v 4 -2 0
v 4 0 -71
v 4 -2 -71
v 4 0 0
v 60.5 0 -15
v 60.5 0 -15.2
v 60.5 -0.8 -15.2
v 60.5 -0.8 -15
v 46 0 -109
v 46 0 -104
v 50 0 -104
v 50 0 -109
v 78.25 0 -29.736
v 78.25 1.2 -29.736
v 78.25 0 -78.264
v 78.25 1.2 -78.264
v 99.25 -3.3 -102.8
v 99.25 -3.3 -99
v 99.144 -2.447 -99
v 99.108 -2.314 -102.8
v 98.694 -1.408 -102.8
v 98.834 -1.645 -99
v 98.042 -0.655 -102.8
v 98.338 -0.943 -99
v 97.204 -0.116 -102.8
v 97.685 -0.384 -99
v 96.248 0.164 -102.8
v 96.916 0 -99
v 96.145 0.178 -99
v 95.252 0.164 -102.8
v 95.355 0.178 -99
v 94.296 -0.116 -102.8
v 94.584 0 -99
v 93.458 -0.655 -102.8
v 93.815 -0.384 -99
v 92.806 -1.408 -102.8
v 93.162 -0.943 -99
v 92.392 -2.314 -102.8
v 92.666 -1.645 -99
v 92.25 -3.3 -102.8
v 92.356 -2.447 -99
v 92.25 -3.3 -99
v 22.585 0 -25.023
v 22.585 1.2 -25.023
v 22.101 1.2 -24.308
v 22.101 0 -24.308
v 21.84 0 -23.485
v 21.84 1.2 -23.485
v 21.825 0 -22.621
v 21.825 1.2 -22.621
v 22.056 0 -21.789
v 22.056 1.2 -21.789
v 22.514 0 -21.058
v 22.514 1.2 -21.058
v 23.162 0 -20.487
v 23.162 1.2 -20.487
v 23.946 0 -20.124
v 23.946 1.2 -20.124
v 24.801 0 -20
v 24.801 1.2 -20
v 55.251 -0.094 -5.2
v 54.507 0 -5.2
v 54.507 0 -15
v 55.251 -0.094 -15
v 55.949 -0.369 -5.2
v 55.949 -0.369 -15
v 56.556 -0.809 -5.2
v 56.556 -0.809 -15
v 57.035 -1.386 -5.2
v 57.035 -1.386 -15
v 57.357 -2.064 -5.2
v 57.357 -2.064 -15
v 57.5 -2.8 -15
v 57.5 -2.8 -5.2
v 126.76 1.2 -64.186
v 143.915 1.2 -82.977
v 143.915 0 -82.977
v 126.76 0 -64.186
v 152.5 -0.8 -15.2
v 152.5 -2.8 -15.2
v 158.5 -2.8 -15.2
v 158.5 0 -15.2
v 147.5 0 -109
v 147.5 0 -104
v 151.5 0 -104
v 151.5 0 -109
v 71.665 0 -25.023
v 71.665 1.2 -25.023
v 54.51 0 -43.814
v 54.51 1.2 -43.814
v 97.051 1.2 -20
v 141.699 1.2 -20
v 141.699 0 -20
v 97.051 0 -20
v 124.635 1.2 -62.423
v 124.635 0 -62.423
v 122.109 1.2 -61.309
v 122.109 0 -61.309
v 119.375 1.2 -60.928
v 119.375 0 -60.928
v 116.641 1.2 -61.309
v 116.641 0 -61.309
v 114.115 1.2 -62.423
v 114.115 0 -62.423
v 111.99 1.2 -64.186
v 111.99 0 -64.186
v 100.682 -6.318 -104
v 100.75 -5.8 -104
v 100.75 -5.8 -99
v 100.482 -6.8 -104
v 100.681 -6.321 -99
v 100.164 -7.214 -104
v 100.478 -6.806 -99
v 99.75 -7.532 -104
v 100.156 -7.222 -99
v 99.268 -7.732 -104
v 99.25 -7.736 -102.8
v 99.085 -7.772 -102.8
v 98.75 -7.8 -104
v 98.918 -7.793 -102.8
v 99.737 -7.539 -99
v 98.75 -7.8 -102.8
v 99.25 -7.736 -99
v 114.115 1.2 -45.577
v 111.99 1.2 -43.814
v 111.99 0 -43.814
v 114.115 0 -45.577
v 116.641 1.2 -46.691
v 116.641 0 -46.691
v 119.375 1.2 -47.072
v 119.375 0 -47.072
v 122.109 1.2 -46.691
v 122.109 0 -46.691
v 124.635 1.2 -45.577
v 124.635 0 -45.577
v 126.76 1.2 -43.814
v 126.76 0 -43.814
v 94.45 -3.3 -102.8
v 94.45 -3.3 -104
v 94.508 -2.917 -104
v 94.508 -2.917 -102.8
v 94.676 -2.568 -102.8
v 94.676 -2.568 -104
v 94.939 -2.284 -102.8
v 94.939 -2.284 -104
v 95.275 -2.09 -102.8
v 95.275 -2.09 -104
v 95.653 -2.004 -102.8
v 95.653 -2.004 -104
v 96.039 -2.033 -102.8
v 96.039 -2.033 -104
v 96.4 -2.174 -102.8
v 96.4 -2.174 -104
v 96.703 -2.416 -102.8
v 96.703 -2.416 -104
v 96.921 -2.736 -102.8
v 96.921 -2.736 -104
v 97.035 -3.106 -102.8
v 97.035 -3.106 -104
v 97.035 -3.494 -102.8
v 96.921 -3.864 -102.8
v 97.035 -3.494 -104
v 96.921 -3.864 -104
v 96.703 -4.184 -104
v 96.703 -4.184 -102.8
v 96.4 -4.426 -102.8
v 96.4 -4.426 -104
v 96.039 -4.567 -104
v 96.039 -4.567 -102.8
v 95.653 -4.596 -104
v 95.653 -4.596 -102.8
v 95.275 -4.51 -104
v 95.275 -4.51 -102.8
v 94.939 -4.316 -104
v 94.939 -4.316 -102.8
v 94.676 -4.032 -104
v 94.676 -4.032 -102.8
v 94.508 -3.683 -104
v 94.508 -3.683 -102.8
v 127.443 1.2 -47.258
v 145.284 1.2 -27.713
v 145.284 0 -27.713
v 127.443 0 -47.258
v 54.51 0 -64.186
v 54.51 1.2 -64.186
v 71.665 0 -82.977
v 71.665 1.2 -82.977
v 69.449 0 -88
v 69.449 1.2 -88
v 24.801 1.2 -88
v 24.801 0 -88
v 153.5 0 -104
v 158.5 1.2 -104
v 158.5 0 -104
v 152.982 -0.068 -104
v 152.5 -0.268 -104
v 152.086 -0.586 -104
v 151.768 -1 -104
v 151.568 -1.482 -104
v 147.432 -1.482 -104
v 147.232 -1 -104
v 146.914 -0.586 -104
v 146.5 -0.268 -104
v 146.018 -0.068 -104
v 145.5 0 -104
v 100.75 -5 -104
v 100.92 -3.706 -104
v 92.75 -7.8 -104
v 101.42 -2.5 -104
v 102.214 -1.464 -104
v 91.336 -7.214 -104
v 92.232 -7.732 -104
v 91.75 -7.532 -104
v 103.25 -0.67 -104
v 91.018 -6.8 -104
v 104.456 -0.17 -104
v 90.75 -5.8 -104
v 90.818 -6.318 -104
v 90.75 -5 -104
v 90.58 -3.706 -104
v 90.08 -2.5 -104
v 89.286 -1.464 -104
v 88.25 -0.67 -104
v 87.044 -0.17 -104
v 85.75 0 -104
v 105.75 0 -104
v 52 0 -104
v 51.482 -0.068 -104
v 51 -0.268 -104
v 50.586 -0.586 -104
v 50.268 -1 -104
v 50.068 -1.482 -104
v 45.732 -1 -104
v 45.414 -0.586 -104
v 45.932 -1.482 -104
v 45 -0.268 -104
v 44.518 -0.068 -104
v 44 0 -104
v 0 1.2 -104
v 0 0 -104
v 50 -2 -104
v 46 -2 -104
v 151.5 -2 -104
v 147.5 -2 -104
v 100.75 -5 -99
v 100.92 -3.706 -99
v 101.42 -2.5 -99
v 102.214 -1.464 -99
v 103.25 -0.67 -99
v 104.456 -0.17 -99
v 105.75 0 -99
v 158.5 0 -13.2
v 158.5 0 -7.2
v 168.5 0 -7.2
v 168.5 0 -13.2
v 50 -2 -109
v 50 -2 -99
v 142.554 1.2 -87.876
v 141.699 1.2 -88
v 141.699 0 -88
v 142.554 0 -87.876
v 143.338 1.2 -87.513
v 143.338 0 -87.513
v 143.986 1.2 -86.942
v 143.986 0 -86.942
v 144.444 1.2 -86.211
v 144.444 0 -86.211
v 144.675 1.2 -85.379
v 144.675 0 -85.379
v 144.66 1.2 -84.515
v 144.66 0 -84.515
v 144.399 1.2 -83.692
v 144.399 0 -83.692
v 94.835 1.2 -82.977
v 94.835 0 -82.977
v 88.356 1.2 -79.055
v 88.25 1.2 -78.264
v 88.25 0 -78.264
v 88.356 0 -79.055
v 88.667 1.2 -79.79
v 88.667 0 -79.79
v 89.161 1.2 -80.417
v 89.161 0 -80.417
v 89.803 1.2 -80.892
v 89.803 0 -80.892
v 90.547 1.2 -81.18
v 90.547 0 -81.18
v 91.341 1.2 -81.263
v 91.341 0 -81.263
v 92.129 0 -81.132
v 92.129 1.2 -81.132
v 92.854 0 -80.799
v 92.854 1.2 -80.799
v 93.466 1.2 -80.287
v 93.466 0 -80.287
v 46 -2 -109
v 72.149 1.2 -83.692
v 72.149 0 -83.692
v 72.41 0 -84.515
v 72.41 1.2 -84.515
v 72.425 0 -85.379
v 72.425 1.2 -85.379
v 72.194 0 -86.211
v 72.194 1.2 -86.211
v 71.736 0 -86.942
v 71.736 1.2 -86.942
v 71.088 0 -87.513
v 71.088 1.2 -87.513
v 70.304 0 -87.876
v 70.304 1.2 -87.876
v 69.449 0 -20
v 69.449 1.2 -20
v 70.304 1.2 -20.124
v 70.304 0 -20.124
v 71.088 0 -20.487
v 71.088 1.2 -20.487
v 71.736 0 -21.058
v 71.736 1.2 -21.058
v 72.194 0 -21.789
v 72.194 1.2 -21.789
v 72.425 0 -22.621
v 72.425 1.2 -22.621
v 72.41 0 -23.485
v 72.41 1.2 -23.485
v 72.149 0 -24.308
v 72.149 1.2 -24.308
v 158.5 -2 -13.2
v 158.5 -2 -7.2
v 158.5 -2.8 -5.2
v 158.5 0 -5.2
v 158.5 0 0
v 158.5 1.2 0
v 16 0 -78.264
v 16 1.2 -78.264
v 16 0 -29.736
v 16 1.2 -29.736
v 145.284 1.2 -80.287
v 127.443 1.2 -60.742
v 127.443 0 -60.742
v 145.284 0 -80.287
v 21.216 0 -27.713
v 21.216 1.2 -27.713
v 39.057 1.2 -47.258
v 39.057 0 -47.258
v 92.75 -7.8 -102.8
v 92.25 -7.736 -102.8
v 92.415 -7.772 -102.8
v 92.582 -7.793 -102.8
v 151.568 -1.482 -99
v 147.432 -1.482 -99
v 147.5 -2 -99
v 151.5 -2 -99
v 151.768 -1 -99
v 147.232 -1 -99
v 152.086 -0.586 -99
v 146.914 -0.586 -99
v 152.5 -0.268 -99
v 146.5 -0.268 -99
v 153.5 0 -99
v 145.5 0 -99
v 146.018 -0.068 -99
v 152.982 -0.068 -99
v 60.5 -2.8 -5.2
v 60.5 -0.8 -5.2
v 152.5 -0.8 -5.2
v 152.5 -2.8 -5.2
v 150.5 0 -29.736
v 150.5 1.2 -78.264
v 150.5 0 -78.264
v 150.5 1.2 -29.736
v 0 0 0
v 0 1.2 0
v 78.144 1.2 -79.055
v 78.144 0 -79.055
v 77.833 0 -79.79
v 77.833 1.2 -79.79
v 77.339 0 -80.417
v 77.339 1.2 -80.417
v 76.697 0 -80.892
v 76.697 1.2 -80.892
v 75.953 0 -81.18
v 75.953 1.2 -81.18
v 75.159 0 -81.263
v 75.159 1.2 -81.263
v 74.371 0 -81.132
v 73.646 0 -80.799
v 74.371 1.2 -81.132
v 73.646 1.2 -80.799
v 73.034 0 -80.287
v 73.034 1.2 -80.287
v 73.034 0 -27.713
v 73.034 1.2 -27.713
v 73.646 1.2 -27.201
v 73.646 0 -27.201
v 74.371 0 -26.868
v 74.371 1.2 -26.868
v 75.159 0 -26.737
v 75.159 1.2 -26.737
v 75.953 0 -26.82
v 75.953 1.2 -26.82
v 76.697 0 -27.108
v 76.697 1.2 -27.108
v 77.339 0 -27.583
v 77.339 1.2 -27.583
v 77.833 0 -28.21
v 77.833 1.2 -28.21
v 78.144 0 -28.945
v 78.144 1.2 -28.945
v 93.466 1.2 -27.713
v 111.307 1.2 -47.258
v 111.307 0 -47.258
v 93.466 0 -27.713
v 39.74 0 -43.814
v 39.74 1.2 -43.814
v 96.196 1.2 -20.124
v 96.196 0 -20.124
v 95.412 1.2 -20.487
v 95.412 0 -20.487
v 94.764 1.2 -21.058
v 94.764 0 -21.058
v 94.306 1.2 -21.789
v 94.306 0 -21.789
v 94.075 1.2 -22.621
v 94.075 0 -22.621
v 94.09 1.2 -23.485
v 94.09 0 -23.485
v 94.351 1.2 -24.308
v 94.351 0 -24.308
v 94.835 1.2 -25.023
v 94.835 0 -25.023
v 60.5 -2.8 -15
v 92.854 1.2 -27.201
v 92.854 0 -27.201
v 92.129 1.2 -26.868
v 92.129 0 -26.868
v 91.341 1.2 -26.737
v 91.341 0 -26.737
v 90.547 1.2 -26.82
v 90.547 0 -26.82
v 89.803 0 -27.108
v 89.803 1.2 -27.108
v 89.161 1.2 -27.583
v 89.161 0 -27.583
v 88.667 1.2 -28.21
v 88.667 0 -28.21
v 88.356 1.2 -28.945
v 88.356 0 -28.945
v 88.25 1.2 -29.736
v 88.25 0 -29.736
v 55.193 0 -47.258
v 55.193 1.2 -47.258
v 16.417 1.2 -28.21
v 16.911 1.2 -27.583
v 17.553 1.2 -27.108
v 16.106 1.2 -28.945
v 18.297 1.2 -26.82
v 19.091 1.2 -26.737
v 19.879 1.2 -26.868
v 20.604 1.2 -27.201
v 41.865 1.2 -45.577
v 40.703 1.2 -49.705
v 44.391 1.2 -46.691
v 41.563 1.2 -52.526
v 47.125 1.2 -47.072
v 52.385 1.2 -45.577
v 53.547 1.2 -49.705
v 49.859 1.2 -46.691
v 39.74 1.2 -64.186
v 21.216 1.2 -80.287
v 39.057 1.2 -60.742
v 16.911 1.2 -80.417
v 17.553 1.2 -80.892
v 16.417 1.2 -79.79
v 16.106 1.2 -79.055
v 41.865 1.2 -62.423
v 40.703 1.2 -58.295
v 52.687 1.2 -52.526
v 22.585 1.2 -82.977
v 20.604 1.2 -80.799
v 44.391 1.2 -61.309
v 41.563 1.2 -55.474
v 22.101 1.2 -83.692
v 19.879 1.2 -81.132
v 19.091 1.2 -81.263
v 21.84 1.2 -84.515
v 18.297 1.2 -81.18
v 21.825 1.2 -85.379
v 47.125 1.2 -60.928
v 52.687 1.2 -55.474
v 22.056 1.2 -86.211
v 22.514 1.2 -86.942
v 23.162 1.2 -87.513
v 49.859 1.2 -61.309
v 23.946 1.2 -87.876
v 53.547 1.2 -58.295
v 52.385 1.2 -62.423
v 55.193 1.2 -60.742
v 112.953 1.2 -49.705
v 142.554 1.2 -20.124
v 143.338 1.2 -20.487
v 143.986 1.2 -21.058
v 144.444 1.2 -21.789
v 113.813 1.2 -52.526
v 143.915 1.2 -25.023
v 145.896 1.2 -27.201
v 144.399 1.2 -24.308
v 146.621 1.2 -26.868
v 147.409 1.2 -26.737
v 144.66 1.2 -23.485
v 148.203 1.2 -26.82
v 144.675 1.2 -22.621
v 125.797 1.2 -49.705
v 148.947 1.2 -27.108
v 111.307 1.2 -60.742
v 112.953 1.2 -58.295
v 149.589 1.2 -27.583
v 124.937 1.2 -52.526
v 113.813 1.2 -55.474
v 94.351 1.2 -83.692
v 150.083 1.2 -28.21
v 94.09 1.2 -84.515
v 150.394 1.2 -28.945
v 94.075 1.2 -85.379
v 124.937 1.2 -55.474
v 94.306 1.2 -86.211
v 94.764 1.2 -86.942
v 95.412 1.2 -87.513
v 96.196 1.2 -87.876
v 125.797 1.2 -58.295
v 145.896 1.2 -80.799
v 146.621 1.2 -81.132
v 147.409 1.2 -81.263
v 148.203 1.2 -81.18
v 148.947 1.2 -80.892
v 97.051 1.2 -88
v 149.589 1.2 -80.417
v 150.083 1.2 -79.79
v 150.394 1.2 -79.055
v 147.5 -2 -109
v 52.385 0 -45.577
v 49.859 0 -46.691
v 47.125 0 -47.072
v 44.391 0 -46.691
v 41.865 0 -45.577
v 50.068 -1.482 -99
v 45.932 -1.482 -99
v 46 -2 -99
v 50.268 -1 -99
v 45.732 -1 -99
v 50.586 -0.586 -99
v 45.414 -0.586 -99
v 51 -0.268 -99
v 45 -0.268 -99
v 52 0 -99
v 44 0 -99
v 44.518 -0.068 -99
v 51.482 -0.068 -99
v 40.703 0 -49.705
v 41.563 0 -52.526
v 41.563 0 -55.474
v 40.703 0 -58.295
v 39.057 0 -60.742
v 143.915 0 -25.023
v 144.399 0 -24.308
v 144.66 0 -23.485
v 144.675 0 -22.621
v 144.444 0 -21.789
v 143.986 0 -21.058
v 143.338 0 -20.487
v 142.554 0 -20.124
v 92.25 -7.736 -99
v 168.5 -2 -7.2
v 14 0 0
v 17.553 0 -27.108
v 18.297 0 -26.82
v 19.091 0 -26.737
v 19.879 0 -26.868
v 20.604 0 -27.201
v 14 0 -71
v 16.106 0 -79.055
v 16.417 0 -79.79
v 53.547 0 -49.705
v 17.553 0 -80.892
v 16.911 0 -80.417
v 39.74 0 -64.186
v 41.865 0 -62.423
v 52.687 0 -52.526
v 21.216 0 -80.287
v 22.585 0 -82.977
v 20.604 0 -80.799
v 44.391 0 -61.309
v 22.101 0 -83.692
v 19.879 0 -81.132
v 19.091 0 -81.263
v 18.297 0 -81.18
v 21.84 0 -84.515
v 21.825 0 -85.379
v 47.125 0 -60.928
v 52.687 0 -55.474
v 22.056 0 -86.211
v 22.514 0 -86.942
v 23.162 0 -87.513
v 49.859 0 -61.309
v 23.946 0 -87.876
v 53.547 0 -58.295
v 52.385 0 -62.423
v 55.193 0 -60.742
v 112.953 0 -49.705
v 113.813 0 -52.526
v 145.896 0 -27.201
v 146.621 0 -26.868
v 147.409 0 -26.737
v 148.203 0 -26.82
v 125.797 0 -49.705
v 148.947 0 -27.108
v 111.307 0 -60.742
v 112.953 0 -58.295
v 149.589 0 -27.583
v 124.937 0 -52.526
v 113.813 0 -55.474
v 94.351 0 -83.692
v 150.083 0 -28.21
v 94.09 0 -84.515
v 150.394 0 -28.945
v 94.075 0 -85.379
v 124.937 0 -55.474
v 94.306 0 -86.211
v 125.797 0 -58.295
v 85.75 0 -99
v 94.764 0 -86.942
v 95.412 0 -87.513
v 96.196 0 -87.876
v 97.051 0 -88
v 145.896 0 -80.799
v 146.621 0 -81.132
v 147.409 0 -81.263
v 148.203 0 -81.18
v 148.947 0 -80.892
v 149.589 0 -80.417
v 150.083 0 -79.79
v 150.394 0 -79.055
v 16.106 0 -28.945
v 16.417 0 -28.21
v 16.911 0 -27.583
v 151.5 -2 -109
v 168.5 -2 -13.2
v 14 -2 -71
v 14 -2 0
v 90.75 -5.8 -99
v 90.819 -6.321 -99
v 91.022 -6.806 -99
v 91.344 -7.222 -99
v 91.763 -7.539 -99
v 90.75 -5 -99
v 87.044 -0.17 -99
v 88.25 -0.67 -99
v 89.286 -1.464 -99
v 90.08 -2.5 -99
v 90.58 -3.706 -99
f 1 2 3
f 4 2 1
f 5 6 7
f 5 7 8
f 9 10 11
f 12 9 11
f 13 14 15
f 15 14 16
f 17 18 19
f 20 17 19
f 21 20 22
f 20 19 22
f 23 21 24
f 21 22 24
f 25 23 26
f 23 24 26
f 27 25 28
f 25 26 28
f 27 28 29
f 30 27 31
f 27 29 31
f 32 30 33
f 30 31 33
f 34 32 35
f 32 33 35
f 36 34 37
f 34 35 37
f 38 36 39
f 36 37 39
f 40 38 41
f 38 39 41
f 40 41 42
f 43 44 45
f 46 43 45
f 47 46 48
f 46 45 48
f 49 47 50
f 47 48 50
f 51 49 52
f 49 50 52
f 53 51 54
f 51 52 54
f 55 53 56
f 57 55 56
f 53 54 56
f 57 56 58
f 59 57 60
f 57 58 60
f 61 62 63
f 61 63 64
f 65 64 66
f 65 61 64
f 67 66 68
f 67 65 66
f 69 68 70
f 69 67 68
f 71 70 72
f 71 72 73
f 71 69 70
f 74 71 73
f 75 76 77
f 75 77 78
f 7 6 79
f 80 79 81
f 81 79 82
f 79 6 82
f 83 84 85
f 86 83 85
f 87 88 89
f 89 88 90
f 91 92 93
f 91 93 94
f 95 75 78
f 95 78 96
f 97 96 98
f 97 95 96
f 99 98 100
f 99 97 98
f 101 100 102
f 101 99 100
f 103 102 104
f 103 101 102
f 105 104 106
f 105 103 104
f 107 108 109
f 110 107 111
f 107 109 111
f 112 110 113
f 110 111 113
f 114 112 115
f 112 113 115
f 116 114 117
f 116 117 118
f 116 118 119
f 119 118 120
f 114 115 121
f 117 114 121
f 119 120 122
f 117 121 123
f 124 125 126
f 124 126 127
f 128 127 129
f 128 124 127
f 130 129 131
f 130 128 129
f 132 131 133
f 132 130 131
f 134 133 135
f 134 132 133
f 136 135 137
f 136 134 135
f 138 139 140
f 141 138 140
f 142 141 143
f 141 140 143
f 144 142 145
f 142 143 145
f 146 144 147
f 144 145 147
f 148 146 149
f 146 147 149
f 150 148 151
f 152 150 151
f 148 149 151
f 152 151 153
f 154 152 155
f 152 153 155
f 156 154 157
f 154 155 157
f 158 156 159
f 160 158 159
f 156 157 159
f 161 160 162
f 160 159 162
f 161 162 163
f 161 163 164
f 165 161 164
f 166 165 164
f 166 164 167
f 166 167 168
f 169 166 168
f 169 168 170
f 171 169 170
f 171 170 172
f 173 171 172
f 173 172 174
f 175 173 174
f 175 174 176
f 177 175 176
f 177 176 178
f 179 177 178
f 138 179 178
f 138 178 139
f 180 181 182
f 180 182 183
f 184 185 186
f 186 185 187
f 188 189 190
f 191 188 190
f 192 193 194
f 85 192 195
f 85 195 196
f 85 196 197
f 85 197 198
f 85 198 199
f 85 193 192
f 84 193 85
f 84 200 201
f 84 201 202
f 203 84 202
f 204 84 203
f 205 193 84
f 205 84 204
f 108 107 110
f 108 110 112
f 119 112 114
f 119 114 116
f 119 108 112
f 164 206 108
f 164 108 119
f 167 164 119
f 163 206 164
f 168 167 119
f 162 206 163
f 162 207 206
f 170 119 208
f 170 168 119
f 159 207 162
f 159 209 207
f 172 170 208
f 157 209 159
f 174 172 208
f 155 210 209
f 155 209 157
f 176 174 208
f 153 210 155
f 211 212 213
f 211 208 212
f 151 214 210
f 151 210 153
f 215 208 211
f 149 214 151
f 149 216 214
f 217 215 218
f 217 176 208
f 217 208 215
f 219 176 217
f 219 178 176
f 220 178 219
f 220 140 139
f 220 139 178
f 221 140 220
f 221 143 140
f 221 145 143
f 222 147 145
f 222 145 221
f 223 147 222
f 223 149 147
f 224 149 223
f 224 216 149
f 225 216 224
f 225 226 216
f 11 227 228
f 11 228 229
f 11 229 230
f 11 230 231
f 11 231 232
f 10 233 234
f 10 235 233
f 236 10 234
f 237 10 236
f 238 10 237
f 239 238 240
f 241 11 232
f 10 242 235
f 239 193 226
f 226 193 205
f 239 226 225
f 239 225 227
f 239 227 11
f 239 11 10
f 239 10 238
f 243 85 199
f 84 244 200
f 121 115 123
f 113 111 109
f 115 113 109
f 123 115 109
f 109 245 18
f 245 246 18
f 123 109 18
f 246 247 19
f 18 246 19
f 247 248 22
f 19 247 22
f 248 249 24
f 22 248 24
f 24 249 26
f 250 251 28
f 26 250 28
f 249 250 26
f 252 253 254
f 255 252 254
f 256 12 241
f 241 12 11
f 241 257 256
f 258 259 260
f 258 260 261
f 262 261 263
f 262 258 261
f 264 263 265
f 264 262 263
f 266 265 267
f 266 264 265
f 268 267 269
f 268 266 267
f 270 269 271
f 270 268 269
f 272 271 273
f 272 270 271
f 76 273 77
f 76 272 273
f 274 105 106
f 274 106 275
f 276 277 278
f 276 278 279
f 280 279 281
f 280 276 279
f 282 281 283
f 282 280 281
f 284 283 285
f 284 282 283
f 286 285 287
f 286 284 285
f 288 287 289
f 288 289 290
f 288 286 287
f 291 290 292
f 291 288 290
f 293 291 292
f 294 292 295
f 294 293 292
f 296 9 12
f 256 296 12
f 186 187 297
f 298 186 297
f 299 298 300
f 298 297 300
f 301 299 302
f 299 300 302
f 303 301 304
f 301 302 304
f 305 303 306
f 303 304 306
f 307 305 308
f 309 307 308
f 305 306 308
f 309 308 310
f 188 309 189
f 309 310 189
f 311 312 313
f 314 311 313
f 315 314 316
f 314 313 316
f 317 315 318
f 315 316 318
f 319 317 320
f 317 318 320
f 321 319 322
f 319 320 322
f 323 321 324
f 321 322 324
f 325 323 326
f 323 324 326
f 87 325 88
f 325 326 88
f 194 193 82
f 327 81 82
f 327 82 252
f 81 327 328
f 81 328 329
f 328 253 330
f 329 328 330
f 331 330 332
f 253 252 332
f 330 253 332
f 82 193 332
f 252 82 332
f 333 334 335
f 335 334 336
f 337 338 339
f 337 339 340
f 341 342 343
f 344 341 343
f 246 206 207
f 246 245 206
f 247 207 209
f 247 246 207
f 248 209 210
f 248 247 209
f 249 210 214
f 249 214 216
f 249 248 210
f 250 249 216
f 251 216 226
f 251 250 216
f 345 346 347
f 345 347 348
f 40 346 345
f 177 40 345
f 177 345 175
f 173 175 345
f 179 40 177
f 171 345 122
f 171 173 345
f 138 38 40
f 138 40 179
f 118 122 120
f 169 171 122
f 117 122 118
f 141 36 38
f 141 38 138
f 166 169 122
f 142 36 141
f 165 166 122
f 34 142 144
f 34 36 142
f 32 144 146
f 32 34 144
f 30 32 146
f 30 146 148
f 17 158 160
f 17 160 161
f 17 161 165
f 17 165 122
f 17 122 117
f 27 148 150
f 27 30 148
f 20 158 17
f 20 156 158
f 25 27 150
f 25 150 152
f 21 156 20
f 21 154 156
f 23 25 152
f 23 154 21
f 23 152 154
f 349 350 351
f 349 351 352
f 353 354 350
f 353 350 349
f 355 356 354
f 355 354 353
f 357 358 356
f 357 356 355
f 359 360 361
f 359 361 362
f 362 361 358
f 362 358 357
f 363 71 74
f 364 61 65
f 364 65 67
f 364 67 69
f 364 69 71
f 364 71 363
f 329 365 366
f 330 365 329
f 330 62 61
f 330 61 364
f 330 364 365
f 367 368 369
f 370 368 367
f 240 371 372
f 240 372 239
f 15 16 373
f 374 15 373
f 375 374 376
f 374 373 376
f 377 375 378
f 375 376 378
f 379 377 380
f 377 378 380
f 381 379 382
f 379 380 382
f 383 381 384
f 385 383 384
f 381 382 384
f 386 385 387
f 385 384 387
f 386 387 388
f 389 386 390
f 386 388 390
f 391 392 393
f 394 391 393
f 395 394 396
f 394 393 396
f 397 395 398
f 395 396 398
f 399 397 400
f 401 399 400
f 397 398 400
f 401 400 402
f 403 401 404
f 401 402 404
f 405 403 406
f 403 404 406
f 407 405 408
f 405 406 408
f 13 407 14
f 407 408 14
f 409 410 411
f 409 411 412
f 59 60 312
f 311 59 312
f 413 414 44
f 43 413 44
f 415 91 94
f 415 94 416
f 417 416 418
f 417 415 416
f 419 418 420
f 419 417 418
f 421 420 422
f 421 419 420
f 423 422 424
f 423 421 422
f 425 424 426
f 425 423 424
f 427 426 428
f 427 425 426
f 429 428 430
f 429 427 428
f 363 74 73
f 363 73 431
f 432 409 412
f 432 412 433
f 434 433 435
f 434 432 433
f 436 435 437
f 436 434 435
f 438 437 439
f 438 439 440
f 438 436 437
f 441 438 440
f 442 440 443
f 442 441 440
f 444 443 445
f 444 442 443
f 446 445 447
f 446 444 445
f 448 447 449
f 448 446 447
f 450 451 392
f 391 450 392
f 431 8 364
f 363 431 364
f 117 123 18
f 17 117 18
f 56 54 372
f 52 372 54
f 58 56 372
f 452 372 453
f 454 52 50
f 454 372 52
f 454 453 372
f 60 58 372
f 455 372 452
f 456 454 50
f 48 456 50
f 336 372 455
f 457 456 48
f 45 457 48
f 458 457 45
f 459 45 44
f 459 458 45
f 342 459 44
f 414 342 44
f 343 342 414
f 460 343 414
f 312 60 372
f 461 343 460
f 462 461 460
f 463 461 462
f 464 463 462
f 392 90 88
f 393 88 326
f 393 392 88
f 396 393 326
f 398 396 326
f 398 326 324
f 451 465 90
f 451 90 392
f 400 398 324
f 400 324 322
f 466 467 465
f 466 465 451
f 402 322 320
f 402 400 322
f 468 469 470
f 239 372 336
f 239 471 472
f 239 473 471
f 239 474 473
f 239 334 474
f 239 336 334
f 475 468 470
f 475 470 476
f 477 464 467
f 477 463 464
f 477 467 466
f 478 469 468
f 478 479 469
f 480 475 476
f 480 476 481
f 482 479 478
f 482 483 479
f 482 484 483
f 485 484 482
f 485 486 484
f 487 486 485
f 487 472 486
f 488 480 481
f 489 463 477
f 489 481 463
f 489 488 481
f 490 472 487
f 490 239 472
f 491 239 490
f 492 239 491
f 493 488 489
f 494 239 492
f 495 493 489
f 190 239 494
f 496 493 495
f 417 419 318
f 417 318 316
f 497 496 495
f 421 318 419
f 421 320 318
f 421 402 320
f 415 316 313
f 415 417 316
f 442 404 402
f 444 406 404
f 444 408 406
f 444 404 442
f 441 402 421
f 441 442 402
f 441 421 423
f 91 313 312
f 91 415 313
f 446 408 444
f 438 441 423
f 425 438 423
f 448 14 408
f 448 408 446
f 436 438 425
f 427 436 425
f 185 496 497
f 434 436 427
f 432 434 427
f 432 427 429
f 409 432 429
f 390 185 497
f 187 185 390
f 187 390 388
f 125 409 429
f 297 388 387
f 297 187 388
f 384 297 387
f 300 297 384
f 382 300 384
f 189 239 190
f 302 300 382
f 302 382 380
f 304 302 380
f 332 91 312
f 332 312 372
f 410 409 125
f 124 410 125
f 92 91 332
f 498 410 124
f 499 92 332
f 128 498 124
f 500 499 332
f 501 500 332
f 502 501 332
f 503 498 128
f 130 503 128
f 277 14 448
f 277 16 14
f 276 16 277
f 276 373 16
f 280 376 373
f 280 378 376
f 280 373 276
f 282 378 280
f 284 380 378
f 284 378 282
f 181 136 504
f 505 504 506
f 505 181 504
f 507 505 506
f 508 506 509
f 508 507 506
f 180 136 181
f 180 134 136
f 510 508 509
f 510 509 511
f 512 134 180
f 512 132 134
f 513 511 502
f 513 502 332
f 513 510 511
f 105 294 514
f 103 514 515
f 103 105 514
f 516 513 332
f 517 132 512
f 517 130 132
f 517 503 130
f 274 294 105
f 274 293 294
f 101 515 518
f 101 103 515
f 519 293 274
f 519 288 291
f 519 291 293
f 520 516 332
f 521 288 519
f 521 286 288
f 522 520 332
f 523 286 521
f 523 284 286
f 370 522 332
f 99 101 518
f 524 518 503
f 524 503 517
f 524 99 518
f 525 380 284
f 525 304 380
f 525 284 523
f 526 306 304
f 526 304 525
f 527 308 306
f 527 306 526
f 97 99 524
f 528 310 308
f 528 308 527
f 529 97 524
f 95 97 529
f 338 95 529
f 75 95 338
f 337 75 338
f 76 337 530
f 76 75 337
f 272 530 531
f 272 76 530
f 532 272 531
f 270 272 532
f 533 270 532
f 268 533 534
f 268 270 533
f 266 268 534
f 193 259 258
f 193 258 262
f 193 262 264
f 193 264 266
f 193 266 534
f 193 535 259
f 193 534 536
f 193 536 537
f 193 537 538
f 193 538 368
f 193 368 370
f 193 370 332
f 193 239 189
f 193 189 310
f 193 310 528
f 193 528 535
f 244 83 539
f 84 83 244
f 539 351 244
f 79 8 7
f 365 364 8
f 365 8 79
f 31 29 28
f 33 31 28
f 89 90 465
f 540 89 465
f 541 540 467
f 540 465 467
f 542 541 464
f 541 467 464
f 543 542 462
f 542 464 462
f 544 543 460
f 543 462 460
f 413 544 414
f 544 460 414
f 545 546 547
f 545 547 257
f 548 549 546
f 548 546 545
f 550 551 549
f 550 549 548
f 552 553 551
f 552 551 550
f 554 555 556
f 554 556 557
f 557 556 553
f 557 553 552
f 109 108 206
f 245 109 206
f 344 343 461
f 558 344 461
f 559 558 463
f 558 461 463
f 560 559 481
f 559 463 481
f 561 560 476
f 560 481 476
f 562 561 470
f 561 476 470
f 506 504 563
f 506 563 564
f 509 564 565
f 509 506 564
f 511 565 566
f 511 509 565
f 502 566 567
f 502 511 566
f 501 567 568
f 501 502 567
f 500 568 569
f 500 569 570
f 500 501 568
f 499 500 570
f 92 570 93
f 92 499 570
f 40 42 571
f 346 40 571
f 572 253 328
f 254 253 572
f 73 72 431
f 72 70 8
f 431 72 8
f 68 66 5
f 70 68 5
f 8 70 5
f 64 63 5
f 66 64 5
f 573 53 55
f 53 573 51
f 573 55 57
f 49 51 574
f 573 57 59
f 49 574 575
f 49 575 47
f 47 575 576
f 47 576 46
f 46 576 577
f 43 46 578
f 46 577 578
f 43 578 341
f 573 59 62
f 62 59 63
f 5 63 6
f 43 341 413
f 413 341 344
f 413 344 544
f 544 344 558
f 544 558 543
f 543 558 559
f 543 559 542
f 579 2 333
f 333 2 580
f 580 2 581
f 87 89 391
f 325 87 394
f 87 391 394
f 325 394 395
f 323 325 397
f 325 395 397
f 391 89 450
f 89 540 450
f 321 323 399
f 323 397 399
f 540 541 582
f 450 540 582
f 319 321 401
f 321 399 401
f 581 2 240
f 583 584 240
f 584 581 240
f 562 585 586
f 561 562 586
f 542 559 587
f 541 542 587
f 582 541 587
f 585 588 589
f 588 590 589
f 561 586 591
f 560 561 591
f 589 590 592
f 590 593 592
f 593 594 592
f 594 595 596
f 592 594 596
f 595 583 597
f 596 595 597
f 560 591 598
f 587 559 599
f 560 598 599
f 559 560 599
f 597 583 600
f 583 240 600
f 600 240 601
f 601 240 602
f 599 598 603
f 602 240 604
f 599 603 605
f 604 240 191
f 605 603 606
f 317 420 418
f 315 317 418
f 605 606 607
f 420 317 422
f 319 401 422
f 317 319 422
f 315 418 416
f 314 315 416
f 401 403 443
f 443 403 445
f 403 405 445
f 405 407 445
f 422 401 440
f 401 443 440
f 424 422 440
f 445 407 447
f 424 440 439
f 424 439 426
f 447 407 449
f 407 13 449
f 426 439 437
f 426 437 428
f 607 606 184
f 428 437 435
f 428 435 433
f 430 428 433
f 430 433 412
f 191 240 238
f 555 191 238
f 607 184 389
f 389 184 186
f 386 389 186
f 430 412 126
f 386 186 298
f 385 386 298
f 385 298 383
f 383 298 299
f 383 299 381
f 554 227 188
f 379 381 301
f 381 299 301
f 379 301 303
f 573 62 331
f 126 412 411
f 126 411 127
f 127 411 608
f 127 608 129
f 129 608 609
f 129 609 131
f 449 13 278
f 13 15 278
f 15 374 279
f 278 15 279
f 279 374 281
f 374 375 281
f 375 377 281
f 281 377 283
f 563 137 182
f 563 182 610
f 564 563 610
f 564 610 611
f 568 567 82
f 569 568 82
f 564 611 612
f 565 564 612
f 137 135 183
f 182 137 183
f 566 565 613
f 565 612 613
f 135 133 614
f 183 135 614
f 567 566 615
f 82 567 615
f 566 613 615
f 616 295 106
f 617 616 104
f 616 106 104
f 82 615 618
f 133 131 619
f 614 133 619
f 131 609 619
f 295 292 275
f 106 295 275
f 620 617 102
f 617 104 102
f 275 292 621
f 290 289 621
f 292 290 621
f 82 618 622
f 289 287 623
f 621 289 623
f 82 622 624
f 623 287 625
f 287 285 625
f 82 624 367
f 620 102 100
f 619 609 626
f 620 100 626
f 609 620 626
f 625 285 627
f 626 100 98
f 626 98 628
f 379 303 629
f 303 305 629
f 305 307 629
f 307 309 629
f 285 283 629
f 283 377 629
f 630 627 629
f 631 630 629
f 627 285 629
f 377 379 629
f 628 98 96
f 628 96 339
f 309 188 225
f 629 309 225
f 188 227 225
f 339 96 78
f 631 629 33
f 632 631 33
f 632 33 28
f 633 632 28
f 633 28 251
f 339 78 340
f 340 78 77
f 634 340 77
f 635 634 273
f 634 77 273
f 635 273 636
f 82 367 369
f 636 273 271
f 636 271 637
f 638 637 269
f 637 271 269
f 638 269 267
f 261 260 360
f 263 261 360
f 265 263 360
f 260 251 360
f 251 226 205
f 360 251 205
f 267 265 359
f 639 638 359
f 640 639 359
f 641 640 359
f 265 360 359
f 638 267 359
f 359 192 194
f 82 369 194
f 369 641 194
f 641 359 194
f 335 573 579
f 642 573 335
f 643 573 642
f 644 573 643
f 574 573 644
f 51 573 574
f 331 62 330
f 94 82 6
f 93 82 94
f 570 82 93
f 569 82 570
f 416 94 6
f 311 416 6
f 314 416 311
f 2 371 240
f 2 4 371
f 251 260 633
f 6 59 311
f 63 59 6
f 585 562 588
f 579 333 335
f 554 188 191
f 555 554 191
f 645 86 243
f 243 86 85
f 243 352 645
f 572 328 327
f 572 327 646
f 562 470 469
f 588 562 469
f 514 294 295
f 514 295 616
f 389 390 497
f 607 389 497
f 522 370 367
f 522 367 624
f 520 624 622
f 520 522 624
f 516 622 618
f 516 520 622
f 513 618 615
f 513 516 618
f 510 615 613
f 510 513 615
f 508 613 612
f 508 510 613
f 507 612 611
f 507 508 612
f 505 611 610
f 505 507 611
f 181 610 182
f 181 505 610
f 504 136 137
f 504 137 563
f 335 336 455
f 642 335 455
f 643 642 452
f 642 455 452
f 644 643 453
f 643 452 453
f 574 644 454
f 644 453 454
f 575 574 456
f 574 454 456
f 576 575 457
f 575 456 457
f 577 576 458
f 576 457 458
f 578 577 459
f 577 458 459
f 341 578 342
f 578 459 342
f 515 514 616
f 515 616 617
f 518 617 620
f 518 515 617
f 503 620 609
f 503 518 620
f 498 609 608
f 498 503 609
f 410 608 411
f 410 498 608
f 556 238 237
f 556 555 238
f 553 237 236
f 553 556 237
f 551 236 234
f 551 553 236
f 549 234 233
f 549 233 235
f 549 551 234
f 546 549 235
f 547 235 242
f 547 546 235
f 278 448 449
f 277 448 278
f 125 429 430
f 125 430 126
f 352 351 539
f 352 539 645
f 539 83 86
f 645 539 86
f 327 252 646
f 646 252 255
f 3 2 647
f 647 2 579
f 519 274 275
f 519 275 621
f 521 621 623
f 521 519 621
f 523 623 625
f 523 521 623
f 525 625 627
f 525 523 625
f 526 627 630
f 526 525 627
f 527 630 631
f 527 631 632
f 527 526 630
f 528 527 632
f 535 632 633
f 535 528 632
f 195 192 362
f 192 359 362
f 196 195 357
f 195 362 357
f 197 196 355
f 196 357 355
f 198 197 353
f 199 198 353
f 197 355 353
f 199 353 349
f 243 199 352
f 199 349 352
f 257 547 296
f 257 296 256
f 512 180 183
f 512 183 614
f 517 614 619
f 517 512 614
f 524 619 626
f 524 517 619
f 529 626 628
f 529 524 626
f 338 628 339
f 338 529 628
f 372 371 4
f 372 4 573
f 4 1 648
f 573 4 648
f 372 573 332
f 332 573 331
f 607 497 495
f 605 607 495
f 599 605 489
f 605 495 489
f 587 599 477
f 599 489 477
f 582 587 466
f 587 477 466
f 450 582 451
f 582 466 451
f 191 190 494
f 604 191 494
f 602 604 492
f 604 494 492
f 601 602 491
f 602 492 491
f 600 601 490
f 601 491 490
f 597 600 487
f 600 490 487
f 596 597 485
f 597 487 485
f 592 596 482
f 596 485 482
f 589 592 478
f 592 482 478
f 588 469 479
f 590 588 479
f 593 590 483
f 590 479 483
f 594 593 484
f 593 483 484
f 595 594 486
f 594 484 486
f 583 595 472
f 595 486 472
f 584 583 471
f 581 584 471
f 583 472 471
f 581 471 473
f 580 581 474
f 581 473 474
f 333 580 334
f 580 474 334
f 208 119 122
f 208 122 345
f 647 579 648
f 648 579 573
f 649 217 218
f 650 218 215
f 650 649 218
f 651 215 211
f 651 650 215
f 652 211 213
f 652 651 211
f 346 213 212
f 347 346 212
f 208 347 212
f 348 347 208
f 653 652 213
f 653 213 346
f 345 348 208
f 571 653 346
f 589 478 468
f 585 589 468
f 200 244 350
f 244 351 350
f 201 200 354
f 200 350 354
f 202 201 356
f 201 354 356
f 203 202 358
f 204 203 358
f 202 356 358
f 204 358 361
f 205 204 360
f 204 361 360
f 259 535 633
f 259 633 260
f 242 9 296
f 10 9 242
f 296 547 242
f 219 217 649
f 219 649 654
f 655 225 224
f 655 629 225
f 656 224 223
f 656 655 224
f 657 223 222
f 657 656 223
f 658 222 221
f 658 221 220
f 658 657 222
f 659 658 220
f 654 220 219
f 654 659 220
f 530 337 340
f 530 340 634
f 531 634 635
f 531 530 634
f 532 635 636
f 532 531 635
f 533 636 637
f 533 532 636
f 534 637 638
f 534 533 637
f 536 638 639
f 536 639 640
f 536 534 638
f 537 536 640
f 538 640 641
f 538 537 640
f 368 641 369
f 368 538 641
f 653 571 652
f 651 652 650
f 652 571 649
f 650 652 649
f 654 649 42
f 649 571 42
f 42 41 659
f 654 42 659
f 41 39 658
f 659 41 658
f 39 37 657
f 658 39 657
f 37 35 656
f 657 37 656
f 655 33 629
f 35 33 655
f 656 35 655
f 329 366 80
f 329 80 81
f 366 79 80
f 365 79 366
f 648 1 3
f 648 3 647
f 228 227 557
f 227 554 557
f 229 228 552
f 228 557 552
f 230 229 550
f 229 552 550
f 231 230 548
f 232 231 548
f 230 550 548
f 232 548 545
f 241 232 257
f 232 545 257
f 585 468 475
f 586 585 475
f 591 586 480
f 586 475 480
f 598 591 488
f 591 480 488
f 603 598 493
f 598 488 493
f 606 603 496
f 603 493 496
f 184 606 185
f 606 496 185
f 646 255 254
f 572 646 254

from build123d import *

# Parameters (mm, degrees)
SKETCH1_W           = 158.5
SKETCH1_H           = 104
SKETCH1_W_2         = 62.25
SKETCH1_H_2         = 68
BOSS_EXTRUDE1_DEPTH = 1.2
SKETCH2_W           = 4
SKETCH2_H           = 10
BOSS_EXTRUDE2_DEPTH = 2
FILLET1_R           = 2
SKETCH3_W           = 10
SKETCH3_H           = 9
BOSS_EXTRUDE3_DEPTH = 5
SKETCH4_R           = 1.3
CUT_EXTRUDE1_DEPTH  = 5
CUT_EXTRUDE2_DEPTH  = 3.8
FILLET2_R           = 5
FILLET3_R           = 2
SKETCH6_W           = 98
SKETCH6_H           = 10
BOSS_EXTRUDE4_DEPTH = 0.8
SKETCH8_W           = 16
SKETCH8_H           = 6
BOSS_EXTRUDE5_DEPTH = 2
SKETCH9_W           = 6
SKETCH9_H           = 10
SKETCH9_W_2         = 3
SKETCH9_H_2         = 9.8
BOSS_EXTRUDE6_DEPTH = 2.8
FILLET4_R           = 3
SKETCH11_W          = 10
SKETCH11_H          = 71
BOSS_EXTRUDE7_DEPTH = 2
BOSS_EXTRUDE8_DEPTH = 1.2


# Some blends are built 0.0001 mm under size
with BuildPart() as part:
    # Sketch1 → Boss-Extrude1 (new body)
    with BuildSketch(Plane(origin=(0, 0, 0), x_dir=(1, 0, 0), z_dir=(0, 1, 0))):
        with Locations((79.25, 52)):
            Rectangle(SKETCH1_W, SKETCH1_H)
        with Locations((119.375, 54)):
            Rectangle(SKETCH1_W_2, SKETCH1_H_2, mode=Mode.SUBTRACT)
        with Locations((47.125, 54)):
            Rectangle(SKETCH1_W_2, SKETCH1_H_2, mode=Mode.SUBTRACT)
    extrude(amount=BOSS_EXTRUDE1_DEPTH)

    # Sketch2 → Boss-Extrude2 (add)
    with BuildSketch(Plane.XZ):
        with Locations((149.5, -104)):
            Rectangle(SKETCH2_W, SKETCH2_H)
        with Locations((48, -104)):
            Rectangle(SKETCH2_W, SKETCH2_H)
    extrude(amount=BOSS_EXTRUDE2_DEPTH)

    # Fillet1
    fillet1_edges = [part.edges().sort_by_distance(p)[0] for p in [
        (50, 0, -101.5),
        (46, 0, -101.5),
        (147.5, 0, -101.5),
        (151.5, 0, -101.5),
    ]]
    fillet(fillet1_edges, radius=FILLET1_R - 0.0001)  # a hair under: the kernel refuses the full size

    # Sketch3 → Boss-Extrude3 (add)
    with BuildSketch(Plane(origin=(0, 0, -104), x_dir=(-1, 0, 0), z_dir=(0, 0, -1))):
        with Locations((-95.75, -3.3)):
            Rectangle(SKETCH3_W, SKETCH3_H)
    extrude(amount=-BOSS_EXTRUDE3_DEPTH)

    # Sketch4 → Cut-Extrude1 (cut)
    with BuildSketch(Plane(origin=(0, 0, -104), x_dir=(-1, 0, 0), z_dir=(0, 0, -1))):
        with Locations((-95.75, -3.3)):
            Circle(SKETCH4_R)
    extrude(amount=-CUT_EXTRUDE1_DEPTH, mode=Mode.SUBTRACT)

    # Sketch5 → Cut-Extrude2 (cut)
    with BuildSketch(Plane.XY.offset(-99)):
        with BuildLine():
            Line((92.25, -3.3), (92.25, -7.8))
            Line((92.25, -7.8), (99.25, -7.8))
            Line((99.25, -7.8), (99.25, -3.3))
            ThreePointArc((99.25, -3.3), (95.75, 0.2), (92.25, -3.3))
        make_face()
    extrude(amount=-CUT_EXTRUDE2_DEPTH, mode=Mode.SUBTRACT)

    # Fillet2
    fillet2_edges = [part.edges().sort_by_distance(p)[0] for p in [
        (100.75, 0, -101.5),
        (90.75, 0, -101.5),
    ]]
    fillet(fillet2_edges, radius=FILLET2_R)

    # Fillet3
    fillet3_edges = [part.edges().sort_by_distance(p)[0] for p in [
        (90.75, -7.8, -101.5),
        (100.75, -7.8, -101.5),
    ]]
    fillet(fillet3_edges, radius=FILLET3_R)

    # Sketch6 → Boss-Extrude4 (add)
    with BuildSketch(Plane.XZ):
        with Locations((109.5, -10.2)):
            Rectangle(SKETCH6_W, SKETCH6_H)
    extrude(amount=BOSS_EXTRUDE4_DEPTH)

    # Sketch8 → Boss-Extrude5 (add)
    with BuildSketch(Plane.XZ):
        with Locations((160.5, -10.2)):
            Rectangle(SKETCH8_W, SKETCH8_H)
    extrude(amount=BOSS_EXTRUDE5_DEPTH)

    # Sketch9 → Boss-Extrude6 (add)
    with BuildSketch(Plane.XZ):
        with Locations((155.5, -10.2)):
            Rectangle(SKETCH9_W, SKETCH9_H)
        with Locations((59, -10.1)):
            Rectangle(SKETCH9_W_2, SKETCH9_H_2)
    extrude(amount=BOSS_EXTRUDE6_DEPTH)

    # Fillet4
    # the kernel refuses this fillet: 3 mm, written as the material it adds along each edge
    with BuildSketch(Plane(origin=(57.5, 0, -5.2), x_dir=(-1, 0, 0), z_dir=(0, 0, -1))) as fillet4_piece_1:
        with BuildLine():
            CenterArc((2.993325909, -3), FILLET4_R, 90, 86.177446271)
            Line((0, -2.8), (-0.059866518, -2.796))
            ThreePointArc((-0.059866518, -2.796), (-0.06, -1.4), (-0.06, 0))
            Line((-0.06, 0), (0, 0.06))
            Line((0, 0.06), (2.993325909, 0.06))
            Line((2.993325909, 0.06), (2.993325909, 0))
        make_face()
    extrude(amount=9.8)

    # Sketch11 → Boss-Extrude7 (add)
    with BuildSketch(Plane.XZ):
        with Locations((9, -35.5)):
            Rectangle(SKETCH11_W, SKETCH11_H)
    extrude(amount=BOSS_EXTRUDE7_DEPTH)

    # Sketch12 → Boss-Extrude8 (add)
    with BuildSketch(Plane(origin=(0, 1.2, 0), x_dir=(1, 0, 0), z_dir=(0, 1, 0))):
        with BuildLine():
            Line((22.585033293, 82.977390915), (39.739539441, 64.185732728))
            ThreePointArc((39.739539441, 64.185732728), (47.125, 60.927763011), (54.510460559, 64.185732728))
            Line((54.510460559, 64.185732728), (71.664966707, 82.977390915))
            ThreePointArc((71.664966707, 82.977390915), (72.194126096, 86.210820537), (69.449328539, 88))
            Line((69.449328539, 88), (53.452699296, 88))
            Line((53.452699296, 88), (53.452699296, 91.208733434))
            Line((53.452699296, 91.208733434), (81.121703178, 91.208733434))
            Line((81.121703178, 91.208733434), (81.121703178, 63.398815268))
            Line((81.121703178, 63.398815268), (78.25, 63.398815268))
            Line((78.25, 63.398815268), (78.25, 78.263994748))
            ThreePointArc((78.25, 78.263994748), (76.334685553, 81.061039126), (73.034361832, 80.286603833))
            Line((73.034361832, 80.286603833), (55.19253522, 60.742030283))
            ThreePointArc((55.19253522, 60.742030283), (52.577995779, 54), (55.19253522, 47.257969717))
            Line((55.19253522, 47.257969717), (73.034361832, 27.713396167))
            ThreePointArc((73.034361832, 27.713396167), (76.334685553, 26.938960874), (78.25, 29.736005252))
            Line((78.25, 29.736005252), (78.25, 51.032908731))
            Line((78.25, 51.032908731), (81.121703178, 51.032908731))
            Line((81.121703178, 51.032908731), (81.121703178, 16.832253351))
            Line((81.121703178, 16.832253351), (49.123041709, 16.832253351))
            Line((49.123041709, 16.832253351), (49.123041709, 20))
            Line((49.123041709, 20), (69.449328539, 20))
            ThreePointArc((69.449328539, 20), (72.194126096, 21.789179463), (71.664966707, 25.022609085))
            Line((71.664966707, 25.022609085), (54.510460559, 43.814267272))
            ThreePointArc((54.510460559, 43.814267272), (47.125, 47.072236989), (39.739539441, 43.814267272))
            Line((39.739539441, 43.814267272), (22.585033293, 25.022609085))
            ThreePointArc((22.585033293, 25.022609085), (22.055873904, 21.789179463), (24.800671461, 20))
            Line((24.800671461, 20), (42.917495227, 20))
            Line((42.917495227, 20), (42.917495227, 16.832253351))
            Line((42.917495227, 16.832253351), (11.408469589, 16.832253351))
            Line((11.408469589, 16.832253351), (11.408469589, 46.938752597))
            Line((11.408469589, 46.938752597), (16, 46.938752597))
            Line((16, 46.938752597), (16, 29.736005252))
            ThreePointArc((16, 29.736005252), (17.915314447, 26.938960874), (21.215638168, 27.713396167))
            Line((21.215638168, 27.713396167), (39.05746478, 47.257969717))
            ThreePointArc((39.05746478, 47.257969717), (41.672004221, 54), (39.05746478, 60.742030283))
            Line((39.05746478, 60.742030283), (21.215638168, 80.286603833))
            ThreePointArc((21.215638168, 80.286603833), (17.915314447, 81.061039126), (16, 78.263994748))
            Line((16, 78.263994748), (16, 63.398815268))
            Line((16, 63.398815268), (11.408469589, 63.398815268))
            Line((11.408469589, 63.398815268), (11.408469589, 91.208733434))
            Line((11.408469589, 91.208733434), (44.179781607, 91.208733434))
            Line((44.179781607, 91.208733434), (44.179781607, 88))
            Line((44.179781607, 88), (24.800671461, 88))
            ThreePointArc((24.800671461, 88), (22.055873904, 86.210820537), (22.585033293, 82.977390915))
        make_face()
    boss_extrude8 = extrude(amount=-BOSS_EXTRUDE8_DEPTH)

    # Mirror1: Boss-Extrude8 across plane
    add(boss_extrude8.mirror(Plane(origin=(83.25, 0, 0), x_dir=(0, 0, 1), z_dir=(1, 0, 0))))


solid = part.part
